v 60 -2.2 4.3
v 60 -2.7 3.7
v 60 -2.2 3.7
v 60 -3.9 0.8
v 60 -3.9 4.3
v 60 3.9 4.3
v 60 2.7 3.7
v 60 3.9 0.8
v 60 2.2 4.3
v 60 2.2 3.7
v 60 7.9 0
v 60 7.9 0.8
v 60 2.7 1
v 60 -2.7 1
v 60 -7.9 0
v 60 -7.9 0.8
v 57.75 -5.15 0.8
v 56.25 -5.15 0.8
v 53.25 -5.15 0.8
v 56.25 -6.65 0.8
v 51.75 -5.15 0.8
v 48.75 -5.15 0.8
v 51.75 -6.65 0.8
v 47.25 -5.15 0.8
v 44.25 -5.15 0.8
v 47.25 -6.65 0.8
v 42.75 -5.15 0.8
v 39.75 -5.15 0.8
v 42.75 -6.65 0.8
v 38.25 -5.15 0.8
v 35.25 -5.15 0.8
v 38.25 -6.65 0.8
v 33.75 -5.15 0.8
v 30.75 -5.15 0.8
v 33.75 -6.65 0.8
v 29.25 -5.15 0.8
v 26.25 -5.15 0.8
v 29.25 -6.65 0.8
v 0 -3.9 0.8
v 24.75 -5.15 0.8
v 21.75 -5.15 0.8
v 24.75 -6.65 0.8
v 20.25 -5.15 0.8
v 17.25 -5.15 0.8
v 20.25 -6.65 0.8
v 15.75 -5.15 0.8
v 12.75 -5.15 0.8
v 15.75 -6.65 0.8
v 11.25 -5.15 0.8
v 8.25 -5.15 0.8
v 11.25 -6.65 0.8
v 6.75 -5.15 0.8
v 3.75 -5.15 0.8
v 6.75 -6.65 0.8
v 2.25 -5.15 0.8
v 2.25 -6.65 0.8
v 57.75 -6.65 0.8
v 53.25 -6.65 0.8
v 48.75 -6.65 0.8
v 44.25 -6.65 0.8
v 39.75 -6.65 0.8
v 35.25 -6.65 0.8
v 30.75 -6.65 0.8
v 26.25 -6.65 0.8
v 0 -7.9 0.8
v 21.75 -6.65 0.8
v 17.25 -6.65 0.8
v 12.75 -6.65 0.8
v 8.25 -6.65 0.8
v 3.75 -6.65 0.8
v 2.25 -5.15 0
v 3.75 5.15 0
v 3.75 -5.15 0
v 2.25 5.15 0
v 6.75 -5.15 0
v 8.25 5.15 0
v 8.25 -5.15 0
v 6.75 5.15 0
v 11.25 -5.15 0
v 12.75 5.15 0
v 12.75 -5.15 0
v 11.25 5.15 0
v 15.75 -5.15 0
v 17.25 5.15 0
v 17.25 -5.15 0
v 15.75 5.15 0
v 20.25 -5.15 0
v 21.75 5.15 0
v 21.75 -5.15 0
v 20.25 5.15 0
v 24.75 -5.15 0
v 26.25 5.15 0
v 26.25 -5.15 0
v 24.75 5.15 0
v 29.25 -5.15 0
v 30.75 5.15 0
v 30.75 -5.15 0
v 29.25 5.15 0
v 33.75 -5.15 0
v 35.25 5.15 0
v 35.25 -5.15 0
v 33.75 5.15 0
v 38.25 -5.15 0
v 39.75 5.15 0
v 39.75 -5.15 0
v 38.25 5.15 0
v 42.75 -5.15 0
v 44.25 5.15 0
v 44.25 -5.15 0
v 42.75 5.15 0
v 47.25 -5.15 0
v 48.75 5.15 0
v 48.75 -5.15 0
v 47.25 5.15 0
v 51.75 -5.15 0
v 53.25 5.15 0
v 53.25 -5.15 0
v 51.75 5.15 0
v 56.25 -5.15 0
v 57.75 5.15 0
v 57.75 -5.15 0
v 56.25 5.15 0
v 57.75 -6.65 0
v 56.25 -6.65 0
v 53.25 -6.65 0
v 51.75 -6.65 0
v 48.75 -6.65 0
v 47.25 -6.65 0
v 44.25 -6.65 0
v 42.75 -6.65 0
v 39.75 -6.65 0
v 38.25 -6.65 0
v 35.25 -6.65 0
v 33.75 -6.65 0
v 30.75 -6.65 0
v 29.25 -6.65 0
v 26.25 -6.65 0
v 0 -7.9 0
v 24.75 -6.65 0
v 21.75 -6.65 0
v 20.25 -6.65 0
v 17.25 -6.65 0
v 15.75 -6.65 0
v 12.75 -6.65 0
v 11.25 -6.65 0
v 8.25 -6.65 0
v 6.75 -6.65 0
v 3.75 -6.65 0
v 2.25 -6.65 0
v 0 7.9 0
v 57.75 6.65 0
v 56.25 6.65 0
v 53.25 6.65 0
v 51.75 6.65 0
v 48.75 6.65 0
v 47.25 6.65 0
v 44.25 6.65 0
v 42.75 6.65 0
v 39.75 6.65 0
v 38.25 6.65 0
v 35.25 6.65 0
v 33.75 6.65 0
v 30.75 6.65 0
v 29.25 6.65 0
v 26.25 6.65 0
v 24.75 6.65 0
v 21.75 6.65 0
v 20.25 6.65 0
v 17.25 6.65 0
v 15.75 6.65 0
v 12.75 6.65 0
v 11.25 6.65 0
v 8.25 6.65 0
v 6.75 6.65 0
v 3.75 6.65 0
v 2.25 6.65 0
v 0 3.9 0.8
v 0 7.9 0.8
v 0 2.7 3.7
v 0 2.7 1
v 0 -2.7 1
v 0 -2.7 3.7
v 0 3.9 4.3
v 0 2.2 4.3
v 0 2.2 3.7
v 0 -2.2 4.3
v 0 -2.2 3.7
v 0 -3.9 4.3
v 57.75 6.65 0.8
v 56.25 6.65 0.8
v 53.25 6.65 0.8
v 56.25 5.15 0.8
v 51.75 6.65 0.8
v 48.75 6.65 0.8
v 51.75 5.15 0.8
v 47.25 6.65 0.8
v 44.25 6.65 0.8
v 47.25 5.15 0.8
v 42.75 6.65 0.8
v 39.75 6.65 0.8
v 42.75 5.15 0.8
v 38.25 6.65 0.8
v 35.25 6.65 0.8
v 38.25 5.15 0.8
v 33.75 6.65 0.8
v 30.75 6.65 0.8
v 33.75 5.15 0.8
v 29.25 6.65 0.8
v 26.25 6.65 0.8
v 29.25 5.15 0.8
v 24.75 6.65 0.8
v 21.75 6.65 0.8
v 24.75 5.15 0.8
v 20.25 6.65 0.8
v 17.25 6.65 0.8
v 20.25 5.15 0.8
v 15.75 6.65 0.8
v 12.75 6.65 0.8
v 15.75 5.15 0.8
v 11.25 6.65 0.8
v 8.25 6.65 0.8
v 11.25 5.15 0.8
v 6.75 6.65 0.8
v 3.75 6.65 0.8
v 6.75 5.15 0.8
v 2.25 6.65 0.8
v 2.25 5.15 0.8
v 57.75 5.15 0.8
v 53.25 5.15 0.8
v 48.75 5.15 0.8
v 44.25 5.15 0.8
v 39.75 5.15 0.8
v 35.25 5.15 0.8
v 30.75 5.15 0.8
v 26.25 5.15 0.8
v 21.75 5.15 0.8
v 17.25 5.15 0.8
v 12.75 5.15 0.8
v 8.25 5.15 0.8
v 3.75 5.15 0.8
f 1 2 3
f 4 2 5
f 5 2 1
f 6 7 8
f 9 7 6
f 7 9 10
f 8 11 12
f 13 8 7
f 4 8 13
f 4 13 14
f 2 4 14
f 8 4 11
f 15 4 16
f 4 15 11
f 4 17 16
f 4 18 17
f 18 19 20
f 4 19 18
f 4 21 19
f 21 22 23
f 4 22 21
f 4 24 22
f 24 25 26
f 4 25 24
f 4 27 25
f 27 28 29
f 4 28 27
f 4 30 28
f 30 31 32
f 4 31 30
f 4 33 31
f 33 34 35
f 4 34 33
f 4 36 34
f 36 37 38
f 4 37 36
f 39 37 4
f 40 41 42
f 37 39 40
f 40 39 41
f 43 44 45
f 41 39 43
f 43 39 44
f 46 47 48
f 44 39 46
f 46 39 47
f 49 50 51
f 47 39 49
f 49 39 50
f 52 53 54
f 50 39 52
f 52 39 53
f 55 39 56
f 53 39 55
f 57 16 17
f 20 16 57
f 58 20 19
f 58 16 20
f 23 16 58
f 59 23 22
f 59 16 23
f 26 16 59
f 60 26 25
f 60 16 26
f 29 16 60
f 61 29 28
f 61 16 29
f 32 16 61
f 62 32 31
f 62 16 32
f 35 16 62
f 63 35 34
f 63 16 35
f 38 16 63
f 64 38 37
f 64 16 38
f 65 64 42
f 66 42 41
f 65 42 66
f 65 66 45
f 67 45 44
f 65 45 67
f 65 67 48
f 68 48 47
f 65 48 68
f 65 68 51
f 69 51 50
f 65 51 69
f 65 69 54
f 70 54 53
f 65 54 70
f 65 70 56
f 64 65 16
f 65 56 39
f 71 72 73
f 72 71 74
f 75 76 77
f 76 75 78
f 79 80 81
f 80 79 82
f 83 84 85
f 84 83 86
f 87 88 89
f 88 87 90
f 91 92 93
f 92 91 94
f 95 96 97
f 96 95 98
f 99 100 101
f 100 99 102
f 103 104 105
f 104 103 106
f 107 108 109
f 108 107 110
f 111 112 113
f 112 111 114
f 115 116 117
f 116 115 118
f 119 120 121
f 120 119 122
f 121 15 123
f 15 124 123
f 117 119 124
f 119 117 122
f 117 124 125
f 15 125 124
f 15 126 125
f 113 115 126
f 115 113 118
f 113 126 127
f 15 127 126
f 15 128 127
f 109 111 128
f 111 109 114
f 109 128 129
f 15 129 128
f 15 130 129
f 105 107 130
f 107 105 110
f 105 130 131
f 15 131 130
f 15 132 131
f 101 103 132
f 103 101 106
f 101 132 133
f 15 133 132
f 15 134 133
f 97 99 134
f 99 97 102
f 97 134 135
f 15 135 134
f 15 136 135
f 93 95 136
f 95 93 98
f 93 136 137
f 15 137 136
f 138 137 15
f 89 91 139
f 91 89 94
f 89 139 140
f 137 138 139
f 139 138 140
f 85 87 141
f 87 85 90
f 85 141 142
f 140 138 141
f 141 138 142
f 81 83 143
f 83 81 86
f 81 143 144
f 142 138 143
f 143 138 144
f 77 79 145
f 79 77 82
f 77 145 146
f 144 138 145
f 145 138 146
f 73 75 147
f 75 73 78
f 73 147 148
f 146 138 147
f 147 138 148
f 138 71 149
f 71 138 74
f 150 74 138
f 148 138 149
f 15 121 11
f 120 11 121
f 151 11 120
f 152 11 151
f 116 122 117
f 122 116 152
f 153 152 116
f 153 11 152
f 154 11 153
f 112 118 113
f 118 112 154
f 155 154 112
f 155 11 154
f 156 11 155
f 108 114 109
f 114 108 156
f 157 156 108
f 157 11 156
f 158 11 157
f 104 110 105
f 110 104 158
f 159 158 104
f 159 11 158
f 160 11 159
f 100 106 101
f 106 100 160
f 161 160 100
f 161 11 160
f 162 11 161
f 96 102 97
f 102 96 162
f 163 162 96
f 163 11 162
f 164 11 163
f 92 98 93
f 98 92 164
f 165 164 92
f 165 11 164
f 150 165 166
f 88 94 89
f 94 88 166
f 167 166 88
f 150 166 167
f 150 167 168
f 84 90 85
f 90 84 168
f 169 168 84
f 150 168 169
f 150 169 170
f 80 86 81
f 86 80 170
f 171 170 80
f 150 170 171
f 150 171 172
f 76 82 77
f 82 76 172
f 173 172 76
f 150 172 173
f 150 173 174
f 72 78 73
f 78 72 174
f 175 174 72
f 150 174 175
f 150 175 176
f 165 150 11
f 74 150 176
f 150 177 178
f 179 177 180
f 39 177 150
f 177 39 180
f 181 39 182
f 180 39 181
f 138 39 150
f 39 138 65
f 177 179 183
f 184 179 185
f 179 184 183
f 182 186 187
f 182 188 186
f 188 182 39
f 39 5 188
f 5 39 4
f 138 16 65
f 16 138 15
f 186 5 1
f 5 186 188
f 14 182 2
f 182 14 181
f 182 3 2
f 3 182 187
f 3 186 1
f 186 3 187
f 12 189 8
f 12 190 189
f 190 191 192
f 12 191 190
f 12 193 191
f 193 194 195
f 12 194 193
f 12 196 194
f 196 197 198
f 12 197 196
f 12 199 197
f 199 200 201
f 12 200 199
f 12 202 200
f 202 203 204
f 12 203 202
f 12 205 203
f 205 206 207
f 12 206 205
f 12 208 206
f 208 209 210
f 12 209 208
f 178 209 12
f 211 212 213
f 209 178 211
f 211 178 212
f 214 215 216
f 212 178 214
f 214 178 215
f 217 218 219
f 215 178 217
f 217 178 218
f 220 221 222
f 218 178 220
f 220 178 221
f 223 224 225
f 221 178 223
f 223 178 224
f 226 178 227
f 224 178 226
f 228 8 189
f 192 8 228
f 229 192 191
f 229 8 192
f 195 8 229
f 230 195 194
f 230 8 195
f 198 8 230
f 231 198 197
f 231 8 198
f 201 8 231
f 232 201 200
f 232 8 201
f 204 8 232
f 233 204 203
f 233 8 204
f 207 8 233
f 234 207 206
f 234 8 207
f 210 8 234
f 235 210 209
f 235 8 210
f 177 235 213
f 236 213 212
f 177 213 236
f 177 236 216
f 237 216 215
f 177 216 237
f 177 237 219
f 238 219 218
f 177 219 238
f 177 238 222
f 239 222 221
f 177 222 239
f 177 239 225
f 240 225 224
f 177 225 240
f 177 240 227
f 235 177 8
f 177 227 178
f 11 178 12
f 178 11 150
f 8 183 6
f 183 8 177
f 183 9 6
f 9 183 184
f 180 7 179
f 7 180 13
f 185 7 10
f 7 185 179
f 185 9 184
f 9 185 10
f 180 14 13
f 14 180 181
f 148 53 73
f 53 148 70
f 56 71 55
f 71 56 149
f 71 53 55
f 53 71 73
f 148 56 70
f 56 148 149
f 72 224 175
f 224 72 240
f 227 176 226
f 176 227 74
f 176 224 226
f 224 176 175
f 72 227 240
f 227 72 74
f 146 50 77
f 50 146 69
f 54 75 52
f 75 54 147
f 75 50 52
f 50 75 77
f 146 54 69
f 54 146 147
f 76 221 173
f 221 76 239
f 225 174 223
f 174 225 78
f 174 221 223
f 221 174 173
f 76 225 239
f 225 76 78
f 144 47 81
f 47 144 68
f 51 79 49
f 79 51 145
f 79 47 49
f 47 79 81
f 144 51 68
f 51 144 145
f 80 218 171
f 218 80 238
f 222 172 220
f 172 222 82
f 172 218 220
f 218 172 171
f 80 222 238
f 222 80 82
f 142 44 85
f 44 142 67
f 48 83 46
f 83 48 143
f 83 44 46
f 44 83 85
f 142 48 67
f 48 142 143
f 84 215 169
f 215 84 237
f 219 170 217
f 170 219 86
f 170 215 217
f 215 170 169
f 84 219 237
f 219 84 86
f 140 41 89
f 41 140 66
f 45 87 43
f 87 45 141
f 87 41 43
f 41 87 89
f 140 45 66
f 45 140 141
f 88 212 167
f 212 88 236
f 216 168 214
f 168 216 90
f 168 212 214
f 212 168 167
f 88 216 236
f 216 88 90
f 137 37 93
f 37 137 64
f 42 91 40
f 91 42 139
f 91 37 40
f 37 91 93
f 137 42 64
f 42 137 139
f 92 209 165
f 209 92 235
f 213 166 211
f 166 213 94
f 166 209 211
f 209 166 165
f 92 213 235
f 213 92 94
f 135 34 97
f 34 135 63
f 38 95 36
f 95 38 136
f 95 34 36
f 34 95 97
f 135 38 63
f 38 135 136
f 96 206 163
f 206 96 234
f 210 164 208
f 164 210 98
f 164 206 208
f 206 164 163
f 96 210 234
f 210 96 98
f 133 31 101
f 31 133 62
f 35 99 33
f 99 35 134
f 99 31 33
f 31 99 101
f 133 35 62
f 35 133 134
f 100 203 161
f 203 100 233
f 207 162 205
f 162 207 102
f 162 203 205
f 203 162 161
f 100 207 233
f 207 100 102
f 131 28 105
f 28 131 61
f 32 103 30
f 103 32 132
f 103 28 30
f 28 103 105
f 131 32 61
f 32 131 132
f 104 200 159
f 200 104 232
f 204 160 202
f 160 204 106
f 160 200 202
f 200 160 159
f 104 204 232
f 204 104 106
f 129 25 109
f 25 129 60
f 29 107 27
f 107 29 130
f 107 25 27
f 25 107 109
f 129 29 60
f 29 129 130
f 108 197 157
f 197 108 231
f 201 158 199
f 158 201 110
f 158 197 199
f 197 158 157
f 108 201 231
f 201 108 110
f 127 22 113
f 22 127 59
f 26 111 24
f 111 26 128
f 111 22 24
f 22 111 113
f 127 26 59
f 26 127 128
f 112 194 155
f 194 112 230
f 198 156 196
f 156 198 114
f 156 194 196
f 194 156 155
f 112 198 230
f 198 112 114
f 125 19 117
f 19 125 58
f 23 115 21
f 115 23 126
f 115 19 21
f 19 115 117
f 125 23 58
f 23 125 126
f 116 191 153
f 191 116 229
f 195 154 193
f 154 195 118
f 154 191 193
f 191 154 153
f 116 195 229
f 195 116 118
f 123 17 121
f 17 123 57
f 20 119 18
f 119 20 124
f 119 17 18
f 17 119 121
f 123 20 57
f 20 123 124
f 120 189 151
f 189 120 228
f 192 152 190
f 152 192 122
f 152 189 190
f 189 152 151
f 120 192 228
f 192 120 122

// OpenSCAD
// Sewable LED-strip clips — rogue AI jacket
// Open in OpenSCAD (free) or MakerWorld's Parametric Model Maker.
// Pick a part below, render (F6), export STL. Print in TPU 95A, flat, no supports.

part = "channel";      // [channel, endcap, splice, elbow45, saddle]

strip_w  = 5.0;   // measure your strip!
strip_t  = 2.5;
fit      = 0.4;
wall     = 1.2;
base     = 1.0;
lip_over = 0.5;
lip_t    = 0.6;
clear    = 0.2;
flange_w = 4.0;
flange_t = 0.8;
hole     = 1.5;
pitch    = 4.5;
seg_len  = 60;

a      = (strip_w + fit) / 2;
wo     = a + wall;
lip_lo = base + strip_t + clear;
top    = lip_lo + lip_t;

module profile_solid(len, extra_w = 0, extra_t = 0) {
    ai = a + extra_w/2; woi = ai + wall; fo = woi + flange_w;
    ll = base + strip_t + extra_t + clear; tp = ll + lip_t;
    translate([0, -woi, 0]) cube([len, 2*woi, base]);
    for (s = [-1, 1]) {
        translate([0, s > 0 ? woi : -fo, 0]) cube([len, flange_w, flange_t]);
        translate([0, s > 0 ? ai : -woi, 0]) cube([len, wall, tp]);
        translate([0, s > 0 ? ai - lip_over : -ai, ll]) cube([len, lip_over, lip_t]);
    }
}

module holes(len, extra_w = 0) {
    hc = a + extra_w/2 + wall + flange_w/2;
    n = floor((len - 1) / pitch);
    x0 = (len - (n - 1) * pitch) / 2;
    for (i = [0 : n - 1], s = [-1, 1])
        translate([x0 + i*pitch - hole/2, s*hc - hole/2, -1]) cube([hole, hole, 10]);
}

module channel(len = seg_len, cap = false, extra_w = 0, extra_t = 0) {
    difference() {
        union() {
            profile_solid(len, extra_w, extra_t);
            if (cap) translate([len - wall, -(a + extra_w/2 + wall), 0])
                cube([wall, 2*(a + extra_w/2 + wall), top + extra_t]);
        }
        holes(len, extra_w);
    }
}

// Two 20 mm arms meeting at 45°, with an open pocket at the joint for the
// three-wire solder bridge. Mirror it in the slicer for the opposite turn.
module elbow45() {
    arm = 20;
    pocket = 10;
    difference() {
        union() {
            channel(arm);
            translate([arm, 0, 0]) rotate([0, 0, 45]) channel(arm);
            translate([arm, 0, 0]) cylinder(r = wo + flange_w, h = flange_t, $fn = 48);
            translate([arm, 0, 0]) cylinder(r = pocket/2 + wall, h = top, $fn = 48);
        }
        translate([arm, 0, base]) cylinder(r = pocket/2, h = 10, $fn = 48);
        translate([arm - 1, -a, base]) cube([2, 2*a, 10]);
    }
}

module saddle(len = 8) {
    post = wo; pad = post + 5; h = strip_t + 0.3;
    difference() {
        union() {
            for (s = [-1, 1]) {
                translate([0, s > 0 ? post : -pad, 0]) cube([len, 5, flange_t]);
                translate([0, s > 0 ? a : -post, 0]) cube([len, wall, h + 0.8]);
            }
            translate([0, -post, h]) cube([len, 2*post, 0.8]);
        }
        for (s = [-1, 1]) translate([len/2 - hole/2, s*(post + 2.5) - hole/2, -1]) cube([hole, hole, 10]);
    }
}

if (part == "channel") channel();
if (part == "endcap")  channel(cap = true);
if (part == "splice")  channel(25, extra_w = 3, extra_t = 2);
if (part == "elbow45") elbow45();
if (part == "saddle")  saddle();
